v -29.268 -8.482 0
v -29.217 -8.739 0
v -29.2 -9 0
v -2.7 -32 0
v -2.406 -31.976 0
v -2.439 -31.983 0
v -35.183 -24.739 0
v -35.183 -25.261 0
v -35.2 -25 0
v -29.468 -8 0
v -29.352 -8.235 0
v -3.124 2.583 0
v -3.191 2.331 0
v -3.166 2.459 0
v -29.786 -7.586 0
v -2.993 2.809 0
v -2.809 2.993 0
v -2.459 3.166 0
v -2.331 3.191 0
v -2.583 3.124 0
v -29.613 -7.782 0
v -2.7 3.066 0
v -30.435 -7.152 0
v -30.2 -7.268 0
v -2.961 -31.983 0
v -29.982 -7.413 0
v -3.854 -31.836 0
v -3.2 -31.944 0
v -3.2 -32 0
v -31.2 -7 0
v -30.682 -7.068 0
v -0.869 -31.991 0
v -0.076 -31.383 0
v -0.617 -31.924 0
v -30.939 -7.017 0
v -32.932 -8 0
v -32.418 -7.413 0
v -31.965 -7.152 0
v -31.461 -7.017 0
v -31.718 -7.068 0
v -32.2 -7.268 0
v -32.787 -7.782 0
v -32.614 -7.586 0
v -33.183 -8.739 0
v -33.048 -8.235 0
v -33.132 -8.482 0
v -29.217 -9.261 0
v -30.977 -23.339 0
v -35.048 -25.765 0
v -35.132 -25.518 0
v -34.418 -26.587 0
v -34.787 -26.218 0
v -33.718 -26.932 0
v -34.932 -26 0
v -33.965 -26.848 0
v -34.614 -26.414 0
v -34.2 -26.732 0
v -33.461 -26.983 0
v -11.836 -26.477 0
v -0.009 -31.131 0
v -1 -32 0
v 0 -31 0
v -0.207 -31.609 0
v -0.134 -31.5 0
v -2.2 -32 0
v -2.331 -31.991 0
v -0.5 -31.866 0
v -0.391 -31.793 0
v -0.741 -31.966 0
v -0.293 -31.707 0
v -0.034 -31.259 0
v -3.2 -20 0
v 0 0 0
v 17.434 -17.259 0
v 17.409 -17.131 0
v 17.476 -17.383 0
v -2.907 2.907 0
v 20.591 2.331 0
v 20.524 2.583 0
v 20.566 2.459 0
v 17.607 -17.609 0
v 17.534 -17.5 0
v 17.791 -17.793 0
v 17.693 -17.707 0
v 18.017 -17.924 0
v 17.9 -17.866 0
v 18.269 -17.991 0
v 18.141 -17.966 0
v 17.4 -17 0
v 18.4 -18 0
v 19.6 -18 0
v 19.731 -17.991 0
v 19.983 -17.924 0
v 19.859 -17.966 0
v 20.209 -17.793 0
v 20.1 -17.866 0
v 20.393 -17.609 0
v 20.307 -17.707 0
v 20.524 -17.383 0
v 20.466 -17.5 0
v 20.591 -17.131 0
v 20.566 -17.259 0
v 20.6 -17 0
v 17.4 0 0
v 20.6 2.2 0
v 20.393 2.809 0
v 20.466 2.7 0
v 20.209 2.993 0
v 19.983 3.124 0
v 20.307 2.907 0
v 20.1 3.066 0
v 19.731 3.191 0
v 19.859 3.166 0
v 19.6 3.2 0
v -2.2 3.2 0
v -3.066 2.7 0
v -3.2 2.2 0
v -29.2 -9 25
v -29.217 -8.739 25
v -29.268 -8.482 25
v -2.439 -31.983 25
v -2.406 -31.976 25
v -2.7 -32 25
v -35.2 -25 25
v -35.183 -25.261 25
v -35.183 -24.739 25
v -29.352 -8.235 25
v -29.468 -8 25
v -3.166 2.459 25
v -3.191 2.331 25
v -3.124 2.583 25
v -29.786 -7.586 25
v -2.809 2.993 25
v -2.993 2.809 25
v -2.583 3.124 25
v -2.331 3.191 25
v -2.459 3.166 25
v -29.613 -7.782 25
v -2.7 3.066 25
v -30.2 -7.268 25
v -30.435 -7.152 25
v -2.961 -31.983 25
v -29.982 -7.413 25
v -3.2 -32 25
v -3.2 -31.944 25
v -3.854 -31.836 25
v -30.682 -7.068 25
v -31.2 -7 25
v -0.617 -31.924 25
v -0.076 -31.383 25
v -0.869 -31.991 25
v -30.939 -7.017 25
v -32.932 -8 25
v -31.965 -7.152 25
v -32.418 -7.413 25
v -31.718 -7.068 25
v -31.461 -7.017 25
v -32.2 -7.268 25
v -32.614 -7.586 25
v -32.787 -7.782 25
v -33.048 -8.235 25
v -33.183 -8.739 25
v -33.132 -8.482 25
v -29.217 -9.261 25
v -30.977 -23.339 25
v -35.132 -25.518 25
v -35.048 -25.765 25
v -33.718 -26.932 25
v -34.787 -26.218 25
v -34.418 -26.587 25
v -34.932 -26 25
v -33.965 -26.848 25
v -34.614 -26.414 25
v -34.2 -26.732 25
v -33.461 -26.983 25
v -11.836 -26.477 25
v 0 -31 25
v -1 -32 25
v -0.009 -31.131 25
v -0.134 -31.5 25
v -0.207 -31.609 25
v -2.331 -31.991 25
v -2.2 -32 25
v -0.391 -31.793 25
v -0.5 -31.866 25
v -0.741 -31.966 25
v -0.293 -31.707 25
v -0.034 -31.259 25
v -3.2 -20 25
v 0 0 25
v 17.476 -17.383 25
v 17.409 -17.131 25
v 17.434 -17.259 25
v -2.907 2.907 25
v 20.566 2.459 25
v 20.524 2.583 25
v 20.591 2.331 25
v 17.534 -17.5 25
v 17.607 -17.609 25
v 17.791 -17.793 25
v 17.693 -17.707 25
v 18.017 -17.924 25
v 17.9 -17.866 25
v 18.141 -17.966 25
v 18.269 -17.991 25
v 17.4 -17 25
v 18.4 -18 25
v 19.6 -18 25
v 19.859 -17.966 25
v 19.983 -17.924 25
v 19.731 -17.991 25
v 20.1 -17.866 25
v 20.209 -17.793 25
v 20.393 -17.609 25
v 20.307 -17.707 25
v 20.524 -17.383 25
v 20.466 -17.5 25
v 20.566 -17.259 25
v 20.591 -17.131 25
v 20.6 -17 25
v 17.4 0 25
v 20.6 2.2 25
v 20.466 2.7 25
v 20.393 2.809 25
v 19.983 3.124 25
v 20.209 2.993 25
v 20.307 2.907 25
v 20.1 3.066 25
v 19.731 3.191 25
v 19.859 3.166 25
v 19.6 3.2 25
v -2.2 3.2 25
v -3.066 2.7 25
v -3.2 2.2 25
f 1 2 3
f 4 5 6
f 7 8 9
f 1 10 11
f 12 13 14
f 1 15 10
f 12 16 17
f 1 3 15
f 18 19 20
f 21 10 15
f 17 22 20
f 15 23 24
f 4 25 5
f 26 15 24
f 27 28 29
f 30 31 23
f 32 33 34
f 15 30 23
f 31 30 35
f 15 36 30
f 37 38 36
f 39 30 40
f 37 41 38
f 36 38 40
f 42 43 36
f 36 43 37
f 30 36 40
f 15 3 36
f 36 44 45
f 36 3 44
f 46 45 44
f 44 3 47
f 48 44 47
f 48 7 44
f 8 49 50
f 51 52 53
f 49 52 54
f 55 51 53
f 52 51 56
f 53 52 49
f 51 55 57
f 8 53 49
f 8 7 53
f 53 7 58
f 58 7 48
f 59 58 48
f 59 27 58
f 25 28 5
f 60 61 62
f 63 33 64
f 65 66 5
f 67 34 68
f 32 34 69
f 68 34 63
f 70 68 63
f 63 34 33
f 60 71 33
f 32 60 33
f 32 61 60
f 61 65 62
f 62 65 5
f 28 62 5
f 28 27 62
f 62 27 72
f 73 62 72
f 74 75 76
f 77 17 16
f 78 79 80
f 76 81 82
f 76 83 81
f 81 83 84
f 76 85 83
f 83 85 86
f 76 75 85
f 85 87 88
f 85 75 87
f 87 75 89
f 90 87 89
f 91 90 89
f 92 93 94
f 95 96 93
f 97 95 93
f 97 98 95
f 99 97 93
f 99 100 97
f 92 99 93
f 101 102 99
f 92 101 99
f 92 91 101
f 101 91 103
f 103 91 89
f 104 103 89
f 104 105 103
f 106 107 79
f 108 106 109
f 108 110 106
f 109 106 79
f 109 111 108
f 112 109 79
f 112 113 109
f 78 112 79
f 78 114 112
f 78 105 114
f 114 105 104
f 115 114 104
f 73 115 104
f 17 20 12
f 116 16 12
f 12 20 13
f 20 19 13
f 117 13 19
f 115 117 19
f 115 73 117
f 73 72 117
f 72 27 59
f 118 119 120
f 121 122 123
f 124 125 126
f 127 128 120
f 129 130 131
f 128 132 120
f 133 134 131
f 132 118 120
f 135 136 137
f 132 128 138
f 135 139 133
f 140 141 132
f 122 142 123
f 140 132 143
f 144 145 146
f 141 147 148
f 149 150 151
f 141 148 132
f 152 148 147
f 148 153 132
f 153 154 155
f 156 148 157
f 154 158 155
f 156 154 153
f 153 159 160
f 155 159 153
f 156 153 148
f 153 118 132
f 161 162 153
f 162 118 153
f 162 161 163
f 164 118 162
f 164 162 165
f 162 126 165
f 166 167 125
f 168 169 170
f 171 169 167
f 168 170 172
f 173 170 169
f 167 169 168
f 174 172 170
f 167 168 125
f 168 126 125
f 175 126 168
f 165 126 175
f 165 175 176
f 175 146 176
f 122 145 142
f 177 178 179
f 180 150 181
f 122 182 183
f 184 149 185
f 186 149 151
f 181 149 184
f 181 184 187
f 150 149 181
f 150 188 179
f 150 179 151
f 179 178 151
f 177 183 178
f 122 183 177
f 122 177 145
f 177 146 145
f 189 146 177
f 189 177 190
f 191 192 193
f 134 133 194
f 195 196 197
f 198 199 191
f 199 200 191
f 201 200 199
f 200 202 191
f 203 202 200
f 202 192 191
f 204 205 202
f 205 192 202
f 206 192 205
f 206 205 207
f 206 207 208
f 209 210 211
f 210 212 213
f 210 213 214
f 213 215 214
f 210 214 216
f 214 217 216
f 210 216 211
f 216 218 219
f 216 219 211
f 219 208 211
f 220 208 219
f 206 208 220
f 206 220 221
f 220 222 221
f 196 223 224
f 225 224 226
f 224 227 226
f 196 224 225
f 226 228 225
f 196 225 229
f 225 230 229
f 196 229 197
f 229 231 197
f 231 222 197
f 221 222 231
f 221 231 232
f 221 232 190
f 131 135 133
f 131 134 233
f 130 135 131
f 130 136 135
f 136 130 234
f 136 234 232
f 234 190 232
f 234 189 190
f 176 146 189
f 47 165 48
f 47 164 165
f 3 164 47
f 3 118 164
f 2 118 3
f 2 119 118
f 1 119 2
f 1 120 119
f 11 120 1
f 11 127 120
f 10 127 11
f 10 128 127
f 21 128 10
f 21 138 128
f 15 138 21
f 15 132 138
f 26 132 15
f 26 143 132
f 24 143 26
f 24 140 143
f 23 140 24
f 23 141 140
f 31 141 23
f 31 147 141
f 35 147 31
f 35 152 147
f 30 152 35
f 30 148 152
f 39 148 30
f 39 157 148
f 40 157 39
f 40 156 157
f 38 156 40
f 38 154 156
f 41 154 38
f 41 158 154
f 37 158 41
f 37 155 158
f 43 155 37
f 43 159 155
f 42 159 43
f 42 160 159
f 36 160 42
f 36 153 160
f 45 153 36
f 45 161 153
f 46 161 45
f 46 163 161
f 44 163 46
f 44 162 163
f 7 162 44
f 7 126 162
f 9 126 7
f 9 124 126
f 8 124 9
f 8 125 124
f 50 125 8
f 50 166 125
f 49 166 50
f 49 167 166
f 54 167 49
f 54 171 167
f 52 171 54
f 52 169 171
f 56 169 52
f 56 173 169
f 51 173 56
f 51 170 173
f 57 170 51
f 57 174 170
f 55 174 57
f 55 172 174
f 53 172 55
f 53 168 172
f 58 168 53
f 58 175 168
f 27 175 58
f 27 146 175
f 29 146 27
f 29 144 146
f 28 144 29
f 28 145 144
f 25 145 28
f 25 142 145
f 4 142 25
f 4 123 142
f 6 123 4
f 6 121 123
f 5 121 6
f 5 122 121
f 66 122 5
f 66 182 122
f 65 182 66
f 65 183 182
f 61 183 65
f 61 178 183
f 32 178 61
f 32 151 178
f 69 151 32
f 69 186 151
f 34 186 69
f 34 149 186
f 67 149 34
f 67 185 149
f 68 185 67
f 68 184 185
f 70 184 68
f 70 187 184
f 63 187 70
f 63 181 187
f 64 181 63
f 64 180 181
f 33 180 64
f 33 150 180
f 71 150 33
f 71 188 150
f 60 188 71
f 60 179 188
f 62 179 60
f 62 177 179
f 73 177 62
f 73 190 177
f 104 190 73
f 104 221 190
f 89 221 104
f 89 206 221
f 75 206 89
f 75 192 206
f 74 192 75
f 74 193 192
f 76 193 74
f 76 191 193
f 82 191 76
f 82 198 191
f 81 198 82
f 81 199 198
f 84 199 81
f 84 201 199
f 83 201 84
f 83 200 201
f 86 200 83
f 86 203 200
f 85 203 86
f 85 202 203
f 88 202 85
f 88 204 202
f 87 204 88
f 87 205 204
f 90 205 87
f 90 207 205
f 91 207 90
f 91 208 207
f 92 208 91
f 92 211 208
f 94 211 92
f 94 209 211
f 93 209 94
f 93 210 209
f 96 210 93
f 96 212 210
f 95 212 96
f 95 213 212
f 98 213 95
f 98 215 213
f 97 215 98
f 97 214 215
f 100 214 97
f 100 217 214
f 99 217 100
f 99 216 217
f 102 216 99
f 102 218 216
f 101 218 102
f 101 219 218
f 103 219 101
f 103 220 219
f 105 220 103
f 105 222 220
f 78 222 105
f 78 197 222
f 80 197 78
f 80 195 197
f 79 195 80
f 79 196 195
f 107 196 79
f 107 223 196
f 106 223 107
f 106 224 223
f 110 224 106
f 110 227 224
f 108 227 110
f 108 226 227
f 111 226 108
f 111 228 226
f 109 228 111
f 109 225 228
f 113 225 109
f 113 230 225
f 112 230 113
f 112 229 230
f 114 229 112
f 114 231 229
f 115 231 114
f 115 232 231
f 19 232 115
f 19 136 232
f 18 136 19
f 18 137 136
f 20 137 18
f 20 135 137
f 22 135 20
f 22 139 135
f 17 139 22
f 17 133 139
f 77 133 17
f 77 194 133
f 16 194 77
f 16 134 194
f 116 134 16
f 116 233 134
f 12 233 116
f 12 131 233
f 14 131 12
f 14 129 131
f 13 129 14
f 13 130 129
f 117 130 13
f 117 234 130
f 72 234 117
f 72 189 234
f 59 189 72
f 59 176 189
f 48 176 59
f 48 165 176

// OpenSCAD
// Krog til at hænge over en PAX/Komplement-skuffefront (17 mm).
// Samme mål som lav_krog.py. Print liggende på siden (bredden = Z på printeren).

front      = 17;    // skuffefrontens tykkelse
sloer      = 0.4;   // luft i slidsen -> 17.4 mm indvendigt
vaeg       = 3.2;   // godstykkelse i klemmen
ben_ude    = 32;    // ben ned ad forsiden
ben_inde   = 18;    // ben ned inde i skuffen
arm_t      = 4;     // krogarmens tykkelse
raek       = 30;    // hvor langt krogen rager ud
stig       = 5;     // armen hælder opad udad
spids_h    = 16;    // spidsens højde
spids_laen = 2;     // spidsen læner ind mod fronten
gusset     = 12;    // forstærkning i hjørnet
bredde     = 25;    // krogens bredde langs fronten
rund       = 1;     // afrunding af udvendige hjørner
$fn = 48;

slids = front + sloer;

module klemme() {
    offset(r = rund) offset(delta = -rund) union() {
        translate([-vaeg, 0])        square([slids + 2 * vaeg, vaeg]);
        translate([-vaeg, -ben_ude]) square([vaeg, ben_ude + vaeg]);
        translate([slids, -ben_inde]) square([vaeg, ben_inde + vaeg]);
    }
}

module profil() {
    y0 = -ben_ude + arm_t / 2;
    p0 = [-vaeg + 0.5, y0];
    p1 = [-vaeg - raek, y0 + stig];
    p2 = [p1[0] + spids_laen, p1[1] + spids_h];
    union() {
        klemme();
        hull() { translate(p0) circle(d = arm_t); translate(p1) circle(d = arm_t); }
        hull() { translate(p1) circle(d = arm_t); translate(p2) circle(d = arm_t); }
        polygon([[-vaeg, -ben_ude + gusset], [-vaeg, -ben_ude],
                 [-vaeg - gusset, -ben_ude + gusset * stig / raek + 1]]);
    }
}

// Liggende på siden, klar til print:
linear_extrude(height = bredde) profil();
